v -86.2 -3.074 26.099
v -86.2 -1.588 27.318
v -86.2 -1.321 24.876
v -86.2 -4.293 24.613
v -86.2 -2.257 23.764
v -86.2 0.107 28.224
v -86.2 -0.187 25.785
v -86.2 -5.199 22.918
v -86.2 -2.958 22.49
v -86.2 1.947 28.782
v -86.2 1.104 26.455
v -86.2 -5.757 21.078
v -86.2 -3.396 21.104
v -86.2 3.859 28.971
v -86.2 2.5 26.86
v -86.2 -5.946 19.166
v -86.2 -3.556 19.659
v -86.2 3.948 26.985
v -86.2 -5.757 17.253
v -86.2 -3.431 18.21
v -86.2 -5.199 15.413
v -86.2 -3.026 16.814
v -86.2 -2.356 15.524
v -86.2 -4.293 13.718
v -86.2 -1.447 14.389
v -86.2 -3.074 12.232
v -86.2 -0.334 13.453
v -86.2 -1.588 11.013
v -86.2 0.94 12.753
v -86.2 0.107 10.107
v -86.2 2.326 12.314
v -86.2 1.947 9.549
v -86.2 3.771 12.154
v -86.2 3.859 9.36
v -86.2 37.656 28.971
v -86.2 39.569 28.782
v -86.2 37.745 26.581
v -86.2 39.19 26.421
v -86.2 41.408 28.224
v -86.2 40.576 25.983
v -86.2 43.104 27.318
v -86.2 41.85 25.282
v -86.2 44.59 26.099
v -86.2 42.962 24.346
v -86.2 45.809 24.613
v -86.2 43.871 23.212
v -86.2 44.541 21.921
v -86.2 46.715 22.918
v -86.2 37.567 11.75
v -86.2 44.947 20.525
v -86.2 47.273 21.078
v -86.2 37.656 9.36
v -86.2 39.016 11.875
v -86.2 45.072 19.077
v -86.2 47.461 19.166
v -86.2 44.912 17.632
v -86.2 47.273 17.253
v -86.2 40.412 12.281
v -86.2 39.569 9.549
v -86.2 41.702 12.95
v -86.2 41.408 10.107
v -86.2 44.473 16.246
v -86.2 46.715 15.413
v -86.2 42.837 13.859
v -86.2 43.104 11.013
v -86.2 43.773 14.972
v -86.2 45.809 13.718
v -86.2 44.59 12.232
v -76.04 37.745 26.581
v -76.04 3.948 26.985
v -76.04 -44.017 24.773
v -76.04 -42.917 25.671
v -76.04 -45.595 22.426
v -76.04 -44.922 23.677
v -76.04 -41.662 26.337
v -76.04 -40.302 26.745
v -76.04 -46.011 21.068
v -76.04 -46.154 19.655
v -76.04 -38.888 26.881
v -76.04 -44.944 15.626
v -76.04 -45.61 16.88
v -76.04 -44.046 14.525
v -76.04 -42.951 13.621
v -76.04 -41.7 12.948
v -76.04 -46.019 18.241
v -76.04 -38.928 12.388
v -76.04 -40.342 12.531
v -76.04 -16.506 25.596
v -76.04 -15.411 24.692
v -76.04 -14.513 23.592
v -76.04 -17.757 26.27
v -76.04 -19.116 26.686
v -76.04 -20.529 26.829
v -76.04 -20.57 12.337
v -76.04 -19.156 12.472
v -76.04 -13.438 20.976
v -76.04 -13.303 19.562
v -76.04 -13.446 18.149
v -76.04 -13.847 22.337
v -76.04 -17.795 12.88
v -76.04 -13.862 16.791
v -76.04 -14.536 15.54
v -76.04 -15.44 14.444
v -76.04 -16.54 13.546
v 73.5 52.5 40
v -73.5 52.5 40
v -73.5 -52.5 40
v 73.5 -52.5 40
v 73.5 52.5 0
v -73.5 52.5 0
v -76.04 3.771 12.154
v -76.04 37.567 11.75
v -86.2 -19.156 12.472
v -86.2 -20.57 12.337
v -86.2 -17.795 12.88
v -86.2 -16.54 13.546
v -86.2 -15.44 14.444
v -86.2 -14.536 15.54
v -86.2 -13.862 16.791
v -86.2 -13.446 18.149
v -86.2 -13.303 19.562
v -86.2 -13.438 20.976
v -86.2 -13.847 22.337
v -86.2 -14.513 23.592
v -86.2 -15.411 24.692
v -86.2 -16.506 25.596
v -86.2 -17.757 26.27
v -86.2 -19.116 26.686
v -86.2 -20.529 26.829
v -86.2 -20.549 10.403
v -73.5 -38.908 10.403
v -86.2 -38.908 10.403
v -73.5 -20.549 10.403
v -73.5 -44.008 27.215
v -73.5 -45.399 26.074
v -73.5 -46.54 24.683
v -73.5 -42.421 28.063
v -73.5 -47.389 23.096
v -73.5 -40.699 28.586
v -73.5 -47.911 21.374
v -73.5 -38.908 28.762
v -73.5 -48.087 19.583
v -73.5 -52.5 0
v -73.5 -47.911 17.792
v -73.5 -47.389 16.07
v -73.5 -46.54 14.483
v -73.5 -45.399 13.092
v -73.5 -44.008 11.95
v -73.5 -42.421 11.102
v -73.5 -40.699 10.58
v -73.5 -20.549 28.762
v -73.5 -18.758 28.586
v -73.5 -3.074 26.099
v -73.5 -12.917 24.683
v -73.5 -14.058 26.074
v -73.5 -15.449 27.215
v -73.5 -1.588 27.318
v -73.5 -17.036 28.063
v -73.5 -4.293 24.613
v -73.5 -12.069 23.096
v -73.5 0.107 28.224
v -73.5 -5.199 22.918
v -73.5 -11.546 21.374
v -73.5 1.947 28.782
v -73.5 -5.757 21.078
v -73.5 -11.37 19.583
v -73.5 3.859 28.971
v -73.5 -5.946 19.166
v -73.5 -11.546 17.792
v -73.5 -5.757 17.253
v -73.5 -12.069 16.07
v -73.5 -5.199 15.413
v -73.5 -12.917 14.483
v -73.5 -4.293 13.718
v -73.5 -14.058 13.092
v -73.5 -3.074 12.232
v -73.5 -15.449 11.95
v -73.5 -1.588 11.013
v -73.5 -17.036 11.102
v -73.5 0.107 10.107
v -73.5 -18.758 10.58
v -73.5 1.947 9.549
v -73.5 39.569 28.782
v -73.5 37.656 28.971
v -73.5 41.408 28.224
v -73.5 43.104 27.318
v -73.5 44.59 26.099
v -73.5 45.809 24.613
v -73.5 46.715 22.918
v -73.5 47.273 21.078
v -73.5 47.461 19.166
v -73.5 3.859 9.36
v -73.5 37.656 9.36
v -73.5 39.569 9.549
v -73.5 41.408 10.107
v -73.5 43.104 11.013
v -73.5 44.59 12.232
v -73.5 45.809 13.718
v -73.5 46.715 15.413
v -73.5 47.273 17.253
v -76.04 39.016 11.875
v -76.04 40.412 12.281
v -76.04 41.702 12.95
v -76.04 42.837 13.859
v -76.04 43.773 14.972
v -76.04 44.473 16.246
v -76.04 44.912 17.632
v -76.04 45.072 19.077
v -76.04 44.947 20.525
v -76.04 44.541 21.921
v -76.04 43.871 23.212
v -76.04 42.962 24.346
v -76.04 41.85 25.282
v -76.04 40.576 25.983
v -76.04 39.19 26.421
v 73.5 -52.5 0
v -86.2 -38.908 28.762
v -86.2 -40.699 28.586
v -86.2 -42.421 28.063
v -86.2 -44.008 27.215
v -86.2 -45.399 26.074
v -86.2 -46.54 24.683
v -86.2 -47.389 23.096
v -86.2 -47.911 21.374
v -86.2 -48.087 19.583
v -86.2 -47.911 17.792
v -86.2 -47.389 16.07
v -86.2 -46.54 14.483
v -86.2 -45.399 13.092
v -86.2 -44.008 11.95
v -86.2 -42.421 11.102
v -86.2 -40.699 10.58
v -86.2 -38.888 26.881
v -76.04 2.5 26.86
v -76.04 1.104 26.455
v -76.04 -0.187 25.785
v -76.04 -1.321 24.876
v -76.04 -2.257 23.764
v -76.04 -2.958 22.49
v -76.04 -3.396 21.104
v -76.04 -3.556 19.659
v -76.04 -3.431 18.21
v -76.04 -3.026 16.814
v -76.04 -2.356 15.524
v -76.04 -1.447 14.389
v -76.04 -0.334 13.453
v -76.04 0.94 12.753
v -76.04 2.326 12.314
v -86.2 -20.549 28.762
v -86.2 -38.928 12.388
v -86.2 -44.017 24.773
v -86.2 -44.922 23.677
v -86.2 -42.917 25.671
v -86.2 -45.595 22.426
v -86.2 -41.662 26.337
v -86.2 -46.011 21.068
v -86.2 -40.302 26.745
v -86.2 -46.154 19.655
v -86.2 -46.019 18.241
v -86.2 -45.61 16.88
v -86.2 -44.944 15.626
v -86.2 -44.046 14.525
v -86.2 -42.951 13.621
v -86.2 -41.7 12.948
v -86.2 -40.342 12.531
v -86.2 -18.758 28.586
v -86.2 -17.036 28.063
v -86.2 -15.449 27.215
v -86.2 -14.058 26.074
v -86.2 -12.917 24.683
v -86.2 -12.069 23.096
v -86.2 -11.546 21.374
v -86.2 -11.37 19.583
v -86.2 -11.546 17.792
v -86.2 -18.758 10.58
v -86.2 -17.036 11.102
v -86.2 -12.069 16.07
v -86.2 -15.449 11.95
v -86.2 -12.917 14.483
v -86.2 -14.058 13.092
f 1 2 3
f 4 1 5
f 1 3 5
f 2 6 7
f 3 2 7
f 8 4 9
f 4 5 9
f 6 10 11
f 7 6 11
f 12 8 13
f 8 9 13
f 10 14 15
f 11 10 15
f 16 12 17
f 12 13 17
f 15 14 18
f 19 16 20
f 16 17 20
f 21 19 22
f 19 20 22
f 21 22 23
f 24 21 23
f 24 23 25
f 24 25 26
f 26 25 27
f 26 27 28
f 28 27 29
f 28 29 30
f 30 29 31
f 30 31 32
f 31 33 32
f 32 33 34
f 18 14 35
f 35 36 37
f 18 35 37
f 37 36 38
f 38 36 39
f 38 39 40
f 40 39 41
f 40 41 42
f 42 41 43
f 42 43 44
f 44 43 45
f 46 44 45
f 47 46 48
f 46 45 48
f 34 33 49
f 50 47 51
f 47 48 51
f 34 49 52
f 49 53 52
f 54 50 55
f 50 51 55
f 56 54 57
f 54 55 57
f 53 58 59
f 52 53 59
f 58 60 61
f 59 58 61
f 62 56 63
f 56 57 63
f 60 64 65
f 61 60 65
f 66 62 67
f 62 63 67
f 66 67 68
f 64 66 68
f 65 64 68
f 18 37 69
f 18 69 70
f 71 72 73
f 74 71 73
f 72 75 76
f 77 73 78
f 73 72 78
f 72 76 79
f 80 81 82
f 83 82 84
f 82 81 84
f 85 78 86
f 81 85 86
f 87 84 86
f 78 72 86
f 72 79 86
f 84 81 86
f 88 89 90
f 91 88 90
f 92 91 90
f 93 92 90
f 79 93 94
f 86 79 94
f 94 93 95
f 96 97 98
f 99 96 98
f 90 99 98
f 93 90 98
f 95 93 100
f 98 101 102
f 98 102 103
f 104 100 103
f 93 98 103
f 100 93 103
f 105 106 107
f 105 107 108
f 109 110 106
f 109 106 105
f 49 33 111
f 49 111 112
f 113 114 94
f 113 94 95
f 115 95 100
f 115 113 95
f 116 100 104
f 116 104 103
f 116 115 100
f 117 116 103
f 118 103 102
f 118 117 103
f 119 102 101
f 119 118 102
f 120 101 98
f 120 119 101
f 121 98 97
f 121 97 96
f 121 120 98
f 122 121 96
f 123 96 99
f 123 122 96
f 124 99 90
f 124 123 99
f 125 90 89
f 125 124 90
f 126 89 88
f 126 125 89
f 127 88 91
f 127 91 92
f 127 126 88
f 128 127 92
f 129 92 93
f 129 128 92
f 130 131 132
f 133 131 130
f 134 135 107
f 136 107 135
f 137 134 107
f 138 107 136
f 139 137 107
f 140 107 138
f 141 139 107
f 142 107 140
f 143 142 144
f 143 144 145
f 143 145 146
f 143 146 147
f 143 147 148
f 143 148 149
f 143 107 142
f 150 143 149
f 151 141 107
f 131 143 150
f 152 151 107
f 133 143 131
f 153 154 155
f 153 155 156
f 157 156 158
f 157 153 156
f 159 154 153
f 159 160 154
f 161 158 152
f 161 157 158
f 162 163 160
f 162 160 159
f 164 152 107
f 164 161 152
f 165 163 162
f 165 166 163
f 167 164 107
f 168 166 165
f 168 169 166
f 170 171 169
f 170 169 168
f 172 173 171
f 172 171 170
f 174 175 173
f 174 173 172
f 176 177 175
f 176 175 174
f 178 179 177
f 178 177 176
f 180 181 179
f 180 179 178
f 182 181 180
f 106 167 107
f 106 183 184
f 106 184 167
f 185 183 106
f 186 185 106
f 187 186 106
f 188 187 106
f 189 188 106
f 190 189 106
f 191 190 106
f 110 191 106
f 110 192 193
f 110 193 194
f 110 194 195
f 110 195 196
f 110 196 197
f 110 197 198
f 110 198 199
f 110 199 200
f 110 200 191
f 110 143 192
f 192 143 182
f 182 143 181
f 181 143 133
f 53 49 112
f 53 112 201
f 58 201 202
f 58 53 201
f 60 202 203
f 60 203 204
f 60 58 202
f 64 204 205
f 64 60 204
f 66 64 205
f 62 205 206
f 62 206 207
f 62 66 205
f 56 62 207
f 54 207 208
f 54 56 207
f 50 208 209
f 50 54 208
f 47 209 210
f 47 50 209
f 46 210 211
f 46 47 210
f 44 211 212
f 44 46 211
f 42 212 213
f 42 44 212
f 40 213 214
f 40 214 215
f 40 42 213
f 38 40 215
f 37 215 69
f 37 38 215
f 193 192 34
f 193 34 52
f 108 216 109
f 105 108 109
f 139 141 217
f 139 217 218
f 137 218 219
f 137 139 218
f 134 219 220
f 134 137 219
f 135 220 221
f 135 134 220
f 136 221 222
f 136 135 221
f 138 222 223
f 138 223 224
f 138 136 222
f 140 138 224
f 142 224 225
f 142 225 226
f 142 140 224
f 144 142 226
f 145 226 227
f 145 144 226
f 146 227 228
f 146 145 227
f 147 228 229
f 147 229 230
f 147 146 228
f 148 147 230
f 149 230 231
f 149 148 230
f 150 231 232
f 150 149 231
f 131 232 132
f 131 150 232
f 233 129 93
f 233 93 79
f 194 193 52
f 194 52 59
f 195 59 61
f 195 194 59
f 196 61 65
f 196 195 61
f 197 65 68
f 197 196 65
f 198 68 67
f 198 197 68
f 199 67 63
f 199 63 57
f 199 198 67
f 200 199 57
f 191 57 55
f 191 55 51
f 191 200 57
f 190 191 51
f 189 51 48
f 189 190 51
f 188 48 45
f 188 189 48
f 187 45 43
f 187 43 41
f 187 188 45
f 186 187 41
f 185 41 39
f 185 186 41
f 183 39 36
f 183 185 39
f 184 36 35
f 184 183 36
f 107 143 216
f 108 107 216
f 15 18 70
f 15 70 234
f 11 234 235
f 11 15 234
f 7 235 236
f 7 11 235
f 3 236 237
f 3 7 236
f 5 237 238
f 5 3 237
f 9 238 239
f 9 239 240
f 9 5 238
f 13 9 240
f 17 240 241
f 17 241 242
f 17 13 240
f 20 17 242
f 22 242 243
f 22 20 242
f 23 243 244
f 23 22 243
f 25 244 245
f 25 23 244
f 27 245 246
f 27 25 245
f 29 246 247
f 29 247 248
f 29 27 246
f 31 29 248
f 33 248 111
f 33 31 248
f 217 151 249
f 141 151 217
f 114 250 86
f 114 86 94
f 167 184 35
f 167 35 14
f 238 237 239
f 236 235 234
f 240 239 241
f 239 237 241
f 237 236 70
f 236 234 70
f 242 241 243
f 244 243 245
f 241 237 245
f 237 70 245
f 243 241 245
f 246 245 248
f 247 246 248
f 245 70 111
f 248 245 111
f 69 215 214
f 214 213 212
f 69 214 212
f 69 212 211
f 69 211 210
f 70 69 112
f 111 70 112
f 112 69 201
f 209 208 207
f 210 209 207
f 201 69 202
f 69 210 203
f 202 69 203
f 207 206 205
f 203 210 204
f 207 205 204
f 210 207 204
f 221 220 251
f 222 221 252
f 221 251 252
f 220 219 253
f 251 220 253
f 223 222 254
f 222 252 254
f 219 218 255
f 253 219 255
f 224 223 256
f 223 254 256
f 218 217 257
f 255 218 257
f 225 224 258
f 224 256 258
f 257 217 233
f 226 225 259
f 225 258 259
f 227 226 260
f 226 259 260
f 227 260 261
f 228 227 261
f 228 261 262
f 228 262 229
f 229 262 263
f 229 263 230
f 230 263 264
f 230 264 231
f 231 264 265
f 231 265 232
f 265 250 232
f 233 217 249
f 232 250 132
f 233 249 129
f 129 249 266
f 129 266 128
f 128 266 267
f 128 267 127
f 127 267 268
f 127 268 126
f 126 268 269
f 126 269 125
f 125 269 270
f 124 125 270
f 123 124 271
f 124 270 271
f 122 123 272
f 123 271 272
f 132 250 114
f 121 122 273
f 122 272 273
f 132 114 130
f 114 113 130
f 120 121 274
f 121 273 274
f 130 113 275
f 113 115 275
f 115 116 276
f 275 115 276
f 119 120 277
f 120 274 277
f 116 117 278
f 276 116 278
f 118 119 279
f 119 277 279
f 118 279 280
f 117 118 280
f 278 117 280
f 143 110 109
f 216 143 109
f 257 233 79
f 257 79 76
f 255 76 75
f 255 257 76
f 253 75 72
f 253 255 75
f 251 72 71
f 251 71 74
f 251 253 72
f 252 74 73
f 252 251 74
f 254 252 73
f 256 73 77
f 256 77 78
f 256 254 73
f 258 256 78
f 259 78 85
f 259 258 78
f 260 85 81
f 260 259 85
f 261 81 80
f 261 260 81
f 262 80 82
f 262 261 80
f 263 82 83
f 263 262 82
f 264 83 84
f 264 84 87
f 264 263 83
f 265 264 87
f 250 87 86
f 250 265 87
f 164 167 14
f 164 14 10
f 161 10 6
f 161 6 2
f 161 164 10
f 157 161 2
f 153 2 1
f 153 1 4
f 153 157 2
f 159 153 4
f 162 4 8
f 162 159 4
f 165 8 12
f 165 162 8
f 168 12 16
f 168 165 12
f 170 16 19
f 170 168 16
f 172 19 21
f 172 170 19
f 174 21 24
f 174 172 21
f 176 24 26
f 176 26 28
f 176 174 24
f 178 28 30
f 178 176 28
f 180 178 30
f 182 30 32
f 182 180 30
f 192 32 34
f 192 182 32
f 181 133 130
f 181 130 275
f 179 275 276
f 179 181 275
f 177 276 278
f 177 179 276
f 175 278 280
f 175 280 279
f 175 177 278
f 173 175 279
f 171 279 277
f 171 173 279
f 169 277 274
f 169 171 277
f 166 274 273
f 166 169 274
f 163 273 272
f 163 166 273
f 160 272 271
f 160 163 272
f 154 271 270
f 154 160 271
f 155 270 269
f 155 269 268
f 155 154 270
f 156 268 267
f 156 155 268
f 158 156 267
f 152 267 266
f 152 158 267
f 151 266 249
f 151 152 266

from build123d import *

# Parameters (mm, degrees)
SKETCH1_W           = 147
SKETCH1_H           = 105
BOSS_EXTRUDE4_DEPTH = 40
BOSS_EXTRUDE5_DEPTH = 12.7
CUT_EXTRUDE3_DEPTH  = 10.16
BOSS_EXTRUDE6_DEPTH = 12.7
CUT_EXTRUDE4_DEPTH  = 10.16


with BuildPart() as part:
    # Sketch1 → Boss-Extrude4 (new body)
    with BuildSketch(Plane.XY):
        Rectangle(SKETCH1_W, SKETCH1_H)
    extrude(amount=BOSS_EXTRUDE4_DEPTH)

    # Sketch6 → Boss-Extrude5 (add)
    with BuildSketch(Plane.ZY.offset(73.5)):
        with BuildLine():
            Line((9.360303109, 3.859497892), (9.360303109, 37.656182133))
            ThreePointArc((9.360303109, 37.656182133), (19.165513969, 47.461392993), (28.970724829, 37.656182133))
            Line((28.970724829, 37.656182133), (28.970724829, 3.859497892))
            ThreePointArc((28.970724829, 3.859497892), (19.165513969, -5.945712968), (9.360303109, 3.859497892))
        make_face()
    extrude(amount=BOSS_EXTRUDE5_DEPTH)

    # Sketch7 → Cut-Extrude3 (cut)
    with BuildSketch(Plane.ZY.offset(86.2)):
        with BuildLine():
            Line((12.154400228, 3.770764543), (11.749992656, 37.567448784))
            ThreePointArc((11.749992656, 37.567448784), (19.076780621, 45.071703446), (26.581035283, 37.744915482))
            Line((26.581035283, 37.744915482), (26.985442854, 3.94823124))
            ThreePointArc((26.985442854, 3.94823124), (19.65865489, -3.556023421), (12.154400228, 3.770764543))
        make_face()
    extrude(amount=-CUT_EXTRUDE3_DEPTH, mode=Mode.SUBTRACT)

    # Sketch8 → Boss-Extrude6 (add)
    with BuildSketch(Plane.ZY.offset(73.5)):
        with BuildLine():
            Line((10.403410648, -38.907911179), (10.403410648, -20.549218505))
            ThreePointArc((10.403410648, -20.549218505), (19.582756985, -11.369872168), (28.762103322, -20.549218505))
            Line((28.762103322, -20.549218505), (28.762103322, -38.907911179))
            ThreePointArc((28.762103322, -38.907911179), (19.582756985, -48.087257516), (10.403410648, -38.907911179))
        make_face()
    extrude(amount=BOSS_EXTRUDE6_DEPTH)

    # Sketch9 → Cut-Extrude4 (cut)
    with BuildSketch(Plane.ZY.offset(86.2)):
        with BuildLine():
            Line((12.388273633, -38.928322069), (12.336561358, -20.569629395))
            ThreePointArc((12.336561358, -20.569629395), (19.562346094, -13.303022878), (26.828952612, -20.528807614))
            Line((26.828952612, -20.528807614), (26.880664887, -38.887500288))
            ThreePointArc((26.880664887, -38.887500288), (19.654880151, -46.154106806), (12.388273633, -38.928322069))
        make_face()
    extrude(amount=-CUT_EXTRUDE4_DEPTH, mode=Mode.SUBTRACT)


solid = part.part
